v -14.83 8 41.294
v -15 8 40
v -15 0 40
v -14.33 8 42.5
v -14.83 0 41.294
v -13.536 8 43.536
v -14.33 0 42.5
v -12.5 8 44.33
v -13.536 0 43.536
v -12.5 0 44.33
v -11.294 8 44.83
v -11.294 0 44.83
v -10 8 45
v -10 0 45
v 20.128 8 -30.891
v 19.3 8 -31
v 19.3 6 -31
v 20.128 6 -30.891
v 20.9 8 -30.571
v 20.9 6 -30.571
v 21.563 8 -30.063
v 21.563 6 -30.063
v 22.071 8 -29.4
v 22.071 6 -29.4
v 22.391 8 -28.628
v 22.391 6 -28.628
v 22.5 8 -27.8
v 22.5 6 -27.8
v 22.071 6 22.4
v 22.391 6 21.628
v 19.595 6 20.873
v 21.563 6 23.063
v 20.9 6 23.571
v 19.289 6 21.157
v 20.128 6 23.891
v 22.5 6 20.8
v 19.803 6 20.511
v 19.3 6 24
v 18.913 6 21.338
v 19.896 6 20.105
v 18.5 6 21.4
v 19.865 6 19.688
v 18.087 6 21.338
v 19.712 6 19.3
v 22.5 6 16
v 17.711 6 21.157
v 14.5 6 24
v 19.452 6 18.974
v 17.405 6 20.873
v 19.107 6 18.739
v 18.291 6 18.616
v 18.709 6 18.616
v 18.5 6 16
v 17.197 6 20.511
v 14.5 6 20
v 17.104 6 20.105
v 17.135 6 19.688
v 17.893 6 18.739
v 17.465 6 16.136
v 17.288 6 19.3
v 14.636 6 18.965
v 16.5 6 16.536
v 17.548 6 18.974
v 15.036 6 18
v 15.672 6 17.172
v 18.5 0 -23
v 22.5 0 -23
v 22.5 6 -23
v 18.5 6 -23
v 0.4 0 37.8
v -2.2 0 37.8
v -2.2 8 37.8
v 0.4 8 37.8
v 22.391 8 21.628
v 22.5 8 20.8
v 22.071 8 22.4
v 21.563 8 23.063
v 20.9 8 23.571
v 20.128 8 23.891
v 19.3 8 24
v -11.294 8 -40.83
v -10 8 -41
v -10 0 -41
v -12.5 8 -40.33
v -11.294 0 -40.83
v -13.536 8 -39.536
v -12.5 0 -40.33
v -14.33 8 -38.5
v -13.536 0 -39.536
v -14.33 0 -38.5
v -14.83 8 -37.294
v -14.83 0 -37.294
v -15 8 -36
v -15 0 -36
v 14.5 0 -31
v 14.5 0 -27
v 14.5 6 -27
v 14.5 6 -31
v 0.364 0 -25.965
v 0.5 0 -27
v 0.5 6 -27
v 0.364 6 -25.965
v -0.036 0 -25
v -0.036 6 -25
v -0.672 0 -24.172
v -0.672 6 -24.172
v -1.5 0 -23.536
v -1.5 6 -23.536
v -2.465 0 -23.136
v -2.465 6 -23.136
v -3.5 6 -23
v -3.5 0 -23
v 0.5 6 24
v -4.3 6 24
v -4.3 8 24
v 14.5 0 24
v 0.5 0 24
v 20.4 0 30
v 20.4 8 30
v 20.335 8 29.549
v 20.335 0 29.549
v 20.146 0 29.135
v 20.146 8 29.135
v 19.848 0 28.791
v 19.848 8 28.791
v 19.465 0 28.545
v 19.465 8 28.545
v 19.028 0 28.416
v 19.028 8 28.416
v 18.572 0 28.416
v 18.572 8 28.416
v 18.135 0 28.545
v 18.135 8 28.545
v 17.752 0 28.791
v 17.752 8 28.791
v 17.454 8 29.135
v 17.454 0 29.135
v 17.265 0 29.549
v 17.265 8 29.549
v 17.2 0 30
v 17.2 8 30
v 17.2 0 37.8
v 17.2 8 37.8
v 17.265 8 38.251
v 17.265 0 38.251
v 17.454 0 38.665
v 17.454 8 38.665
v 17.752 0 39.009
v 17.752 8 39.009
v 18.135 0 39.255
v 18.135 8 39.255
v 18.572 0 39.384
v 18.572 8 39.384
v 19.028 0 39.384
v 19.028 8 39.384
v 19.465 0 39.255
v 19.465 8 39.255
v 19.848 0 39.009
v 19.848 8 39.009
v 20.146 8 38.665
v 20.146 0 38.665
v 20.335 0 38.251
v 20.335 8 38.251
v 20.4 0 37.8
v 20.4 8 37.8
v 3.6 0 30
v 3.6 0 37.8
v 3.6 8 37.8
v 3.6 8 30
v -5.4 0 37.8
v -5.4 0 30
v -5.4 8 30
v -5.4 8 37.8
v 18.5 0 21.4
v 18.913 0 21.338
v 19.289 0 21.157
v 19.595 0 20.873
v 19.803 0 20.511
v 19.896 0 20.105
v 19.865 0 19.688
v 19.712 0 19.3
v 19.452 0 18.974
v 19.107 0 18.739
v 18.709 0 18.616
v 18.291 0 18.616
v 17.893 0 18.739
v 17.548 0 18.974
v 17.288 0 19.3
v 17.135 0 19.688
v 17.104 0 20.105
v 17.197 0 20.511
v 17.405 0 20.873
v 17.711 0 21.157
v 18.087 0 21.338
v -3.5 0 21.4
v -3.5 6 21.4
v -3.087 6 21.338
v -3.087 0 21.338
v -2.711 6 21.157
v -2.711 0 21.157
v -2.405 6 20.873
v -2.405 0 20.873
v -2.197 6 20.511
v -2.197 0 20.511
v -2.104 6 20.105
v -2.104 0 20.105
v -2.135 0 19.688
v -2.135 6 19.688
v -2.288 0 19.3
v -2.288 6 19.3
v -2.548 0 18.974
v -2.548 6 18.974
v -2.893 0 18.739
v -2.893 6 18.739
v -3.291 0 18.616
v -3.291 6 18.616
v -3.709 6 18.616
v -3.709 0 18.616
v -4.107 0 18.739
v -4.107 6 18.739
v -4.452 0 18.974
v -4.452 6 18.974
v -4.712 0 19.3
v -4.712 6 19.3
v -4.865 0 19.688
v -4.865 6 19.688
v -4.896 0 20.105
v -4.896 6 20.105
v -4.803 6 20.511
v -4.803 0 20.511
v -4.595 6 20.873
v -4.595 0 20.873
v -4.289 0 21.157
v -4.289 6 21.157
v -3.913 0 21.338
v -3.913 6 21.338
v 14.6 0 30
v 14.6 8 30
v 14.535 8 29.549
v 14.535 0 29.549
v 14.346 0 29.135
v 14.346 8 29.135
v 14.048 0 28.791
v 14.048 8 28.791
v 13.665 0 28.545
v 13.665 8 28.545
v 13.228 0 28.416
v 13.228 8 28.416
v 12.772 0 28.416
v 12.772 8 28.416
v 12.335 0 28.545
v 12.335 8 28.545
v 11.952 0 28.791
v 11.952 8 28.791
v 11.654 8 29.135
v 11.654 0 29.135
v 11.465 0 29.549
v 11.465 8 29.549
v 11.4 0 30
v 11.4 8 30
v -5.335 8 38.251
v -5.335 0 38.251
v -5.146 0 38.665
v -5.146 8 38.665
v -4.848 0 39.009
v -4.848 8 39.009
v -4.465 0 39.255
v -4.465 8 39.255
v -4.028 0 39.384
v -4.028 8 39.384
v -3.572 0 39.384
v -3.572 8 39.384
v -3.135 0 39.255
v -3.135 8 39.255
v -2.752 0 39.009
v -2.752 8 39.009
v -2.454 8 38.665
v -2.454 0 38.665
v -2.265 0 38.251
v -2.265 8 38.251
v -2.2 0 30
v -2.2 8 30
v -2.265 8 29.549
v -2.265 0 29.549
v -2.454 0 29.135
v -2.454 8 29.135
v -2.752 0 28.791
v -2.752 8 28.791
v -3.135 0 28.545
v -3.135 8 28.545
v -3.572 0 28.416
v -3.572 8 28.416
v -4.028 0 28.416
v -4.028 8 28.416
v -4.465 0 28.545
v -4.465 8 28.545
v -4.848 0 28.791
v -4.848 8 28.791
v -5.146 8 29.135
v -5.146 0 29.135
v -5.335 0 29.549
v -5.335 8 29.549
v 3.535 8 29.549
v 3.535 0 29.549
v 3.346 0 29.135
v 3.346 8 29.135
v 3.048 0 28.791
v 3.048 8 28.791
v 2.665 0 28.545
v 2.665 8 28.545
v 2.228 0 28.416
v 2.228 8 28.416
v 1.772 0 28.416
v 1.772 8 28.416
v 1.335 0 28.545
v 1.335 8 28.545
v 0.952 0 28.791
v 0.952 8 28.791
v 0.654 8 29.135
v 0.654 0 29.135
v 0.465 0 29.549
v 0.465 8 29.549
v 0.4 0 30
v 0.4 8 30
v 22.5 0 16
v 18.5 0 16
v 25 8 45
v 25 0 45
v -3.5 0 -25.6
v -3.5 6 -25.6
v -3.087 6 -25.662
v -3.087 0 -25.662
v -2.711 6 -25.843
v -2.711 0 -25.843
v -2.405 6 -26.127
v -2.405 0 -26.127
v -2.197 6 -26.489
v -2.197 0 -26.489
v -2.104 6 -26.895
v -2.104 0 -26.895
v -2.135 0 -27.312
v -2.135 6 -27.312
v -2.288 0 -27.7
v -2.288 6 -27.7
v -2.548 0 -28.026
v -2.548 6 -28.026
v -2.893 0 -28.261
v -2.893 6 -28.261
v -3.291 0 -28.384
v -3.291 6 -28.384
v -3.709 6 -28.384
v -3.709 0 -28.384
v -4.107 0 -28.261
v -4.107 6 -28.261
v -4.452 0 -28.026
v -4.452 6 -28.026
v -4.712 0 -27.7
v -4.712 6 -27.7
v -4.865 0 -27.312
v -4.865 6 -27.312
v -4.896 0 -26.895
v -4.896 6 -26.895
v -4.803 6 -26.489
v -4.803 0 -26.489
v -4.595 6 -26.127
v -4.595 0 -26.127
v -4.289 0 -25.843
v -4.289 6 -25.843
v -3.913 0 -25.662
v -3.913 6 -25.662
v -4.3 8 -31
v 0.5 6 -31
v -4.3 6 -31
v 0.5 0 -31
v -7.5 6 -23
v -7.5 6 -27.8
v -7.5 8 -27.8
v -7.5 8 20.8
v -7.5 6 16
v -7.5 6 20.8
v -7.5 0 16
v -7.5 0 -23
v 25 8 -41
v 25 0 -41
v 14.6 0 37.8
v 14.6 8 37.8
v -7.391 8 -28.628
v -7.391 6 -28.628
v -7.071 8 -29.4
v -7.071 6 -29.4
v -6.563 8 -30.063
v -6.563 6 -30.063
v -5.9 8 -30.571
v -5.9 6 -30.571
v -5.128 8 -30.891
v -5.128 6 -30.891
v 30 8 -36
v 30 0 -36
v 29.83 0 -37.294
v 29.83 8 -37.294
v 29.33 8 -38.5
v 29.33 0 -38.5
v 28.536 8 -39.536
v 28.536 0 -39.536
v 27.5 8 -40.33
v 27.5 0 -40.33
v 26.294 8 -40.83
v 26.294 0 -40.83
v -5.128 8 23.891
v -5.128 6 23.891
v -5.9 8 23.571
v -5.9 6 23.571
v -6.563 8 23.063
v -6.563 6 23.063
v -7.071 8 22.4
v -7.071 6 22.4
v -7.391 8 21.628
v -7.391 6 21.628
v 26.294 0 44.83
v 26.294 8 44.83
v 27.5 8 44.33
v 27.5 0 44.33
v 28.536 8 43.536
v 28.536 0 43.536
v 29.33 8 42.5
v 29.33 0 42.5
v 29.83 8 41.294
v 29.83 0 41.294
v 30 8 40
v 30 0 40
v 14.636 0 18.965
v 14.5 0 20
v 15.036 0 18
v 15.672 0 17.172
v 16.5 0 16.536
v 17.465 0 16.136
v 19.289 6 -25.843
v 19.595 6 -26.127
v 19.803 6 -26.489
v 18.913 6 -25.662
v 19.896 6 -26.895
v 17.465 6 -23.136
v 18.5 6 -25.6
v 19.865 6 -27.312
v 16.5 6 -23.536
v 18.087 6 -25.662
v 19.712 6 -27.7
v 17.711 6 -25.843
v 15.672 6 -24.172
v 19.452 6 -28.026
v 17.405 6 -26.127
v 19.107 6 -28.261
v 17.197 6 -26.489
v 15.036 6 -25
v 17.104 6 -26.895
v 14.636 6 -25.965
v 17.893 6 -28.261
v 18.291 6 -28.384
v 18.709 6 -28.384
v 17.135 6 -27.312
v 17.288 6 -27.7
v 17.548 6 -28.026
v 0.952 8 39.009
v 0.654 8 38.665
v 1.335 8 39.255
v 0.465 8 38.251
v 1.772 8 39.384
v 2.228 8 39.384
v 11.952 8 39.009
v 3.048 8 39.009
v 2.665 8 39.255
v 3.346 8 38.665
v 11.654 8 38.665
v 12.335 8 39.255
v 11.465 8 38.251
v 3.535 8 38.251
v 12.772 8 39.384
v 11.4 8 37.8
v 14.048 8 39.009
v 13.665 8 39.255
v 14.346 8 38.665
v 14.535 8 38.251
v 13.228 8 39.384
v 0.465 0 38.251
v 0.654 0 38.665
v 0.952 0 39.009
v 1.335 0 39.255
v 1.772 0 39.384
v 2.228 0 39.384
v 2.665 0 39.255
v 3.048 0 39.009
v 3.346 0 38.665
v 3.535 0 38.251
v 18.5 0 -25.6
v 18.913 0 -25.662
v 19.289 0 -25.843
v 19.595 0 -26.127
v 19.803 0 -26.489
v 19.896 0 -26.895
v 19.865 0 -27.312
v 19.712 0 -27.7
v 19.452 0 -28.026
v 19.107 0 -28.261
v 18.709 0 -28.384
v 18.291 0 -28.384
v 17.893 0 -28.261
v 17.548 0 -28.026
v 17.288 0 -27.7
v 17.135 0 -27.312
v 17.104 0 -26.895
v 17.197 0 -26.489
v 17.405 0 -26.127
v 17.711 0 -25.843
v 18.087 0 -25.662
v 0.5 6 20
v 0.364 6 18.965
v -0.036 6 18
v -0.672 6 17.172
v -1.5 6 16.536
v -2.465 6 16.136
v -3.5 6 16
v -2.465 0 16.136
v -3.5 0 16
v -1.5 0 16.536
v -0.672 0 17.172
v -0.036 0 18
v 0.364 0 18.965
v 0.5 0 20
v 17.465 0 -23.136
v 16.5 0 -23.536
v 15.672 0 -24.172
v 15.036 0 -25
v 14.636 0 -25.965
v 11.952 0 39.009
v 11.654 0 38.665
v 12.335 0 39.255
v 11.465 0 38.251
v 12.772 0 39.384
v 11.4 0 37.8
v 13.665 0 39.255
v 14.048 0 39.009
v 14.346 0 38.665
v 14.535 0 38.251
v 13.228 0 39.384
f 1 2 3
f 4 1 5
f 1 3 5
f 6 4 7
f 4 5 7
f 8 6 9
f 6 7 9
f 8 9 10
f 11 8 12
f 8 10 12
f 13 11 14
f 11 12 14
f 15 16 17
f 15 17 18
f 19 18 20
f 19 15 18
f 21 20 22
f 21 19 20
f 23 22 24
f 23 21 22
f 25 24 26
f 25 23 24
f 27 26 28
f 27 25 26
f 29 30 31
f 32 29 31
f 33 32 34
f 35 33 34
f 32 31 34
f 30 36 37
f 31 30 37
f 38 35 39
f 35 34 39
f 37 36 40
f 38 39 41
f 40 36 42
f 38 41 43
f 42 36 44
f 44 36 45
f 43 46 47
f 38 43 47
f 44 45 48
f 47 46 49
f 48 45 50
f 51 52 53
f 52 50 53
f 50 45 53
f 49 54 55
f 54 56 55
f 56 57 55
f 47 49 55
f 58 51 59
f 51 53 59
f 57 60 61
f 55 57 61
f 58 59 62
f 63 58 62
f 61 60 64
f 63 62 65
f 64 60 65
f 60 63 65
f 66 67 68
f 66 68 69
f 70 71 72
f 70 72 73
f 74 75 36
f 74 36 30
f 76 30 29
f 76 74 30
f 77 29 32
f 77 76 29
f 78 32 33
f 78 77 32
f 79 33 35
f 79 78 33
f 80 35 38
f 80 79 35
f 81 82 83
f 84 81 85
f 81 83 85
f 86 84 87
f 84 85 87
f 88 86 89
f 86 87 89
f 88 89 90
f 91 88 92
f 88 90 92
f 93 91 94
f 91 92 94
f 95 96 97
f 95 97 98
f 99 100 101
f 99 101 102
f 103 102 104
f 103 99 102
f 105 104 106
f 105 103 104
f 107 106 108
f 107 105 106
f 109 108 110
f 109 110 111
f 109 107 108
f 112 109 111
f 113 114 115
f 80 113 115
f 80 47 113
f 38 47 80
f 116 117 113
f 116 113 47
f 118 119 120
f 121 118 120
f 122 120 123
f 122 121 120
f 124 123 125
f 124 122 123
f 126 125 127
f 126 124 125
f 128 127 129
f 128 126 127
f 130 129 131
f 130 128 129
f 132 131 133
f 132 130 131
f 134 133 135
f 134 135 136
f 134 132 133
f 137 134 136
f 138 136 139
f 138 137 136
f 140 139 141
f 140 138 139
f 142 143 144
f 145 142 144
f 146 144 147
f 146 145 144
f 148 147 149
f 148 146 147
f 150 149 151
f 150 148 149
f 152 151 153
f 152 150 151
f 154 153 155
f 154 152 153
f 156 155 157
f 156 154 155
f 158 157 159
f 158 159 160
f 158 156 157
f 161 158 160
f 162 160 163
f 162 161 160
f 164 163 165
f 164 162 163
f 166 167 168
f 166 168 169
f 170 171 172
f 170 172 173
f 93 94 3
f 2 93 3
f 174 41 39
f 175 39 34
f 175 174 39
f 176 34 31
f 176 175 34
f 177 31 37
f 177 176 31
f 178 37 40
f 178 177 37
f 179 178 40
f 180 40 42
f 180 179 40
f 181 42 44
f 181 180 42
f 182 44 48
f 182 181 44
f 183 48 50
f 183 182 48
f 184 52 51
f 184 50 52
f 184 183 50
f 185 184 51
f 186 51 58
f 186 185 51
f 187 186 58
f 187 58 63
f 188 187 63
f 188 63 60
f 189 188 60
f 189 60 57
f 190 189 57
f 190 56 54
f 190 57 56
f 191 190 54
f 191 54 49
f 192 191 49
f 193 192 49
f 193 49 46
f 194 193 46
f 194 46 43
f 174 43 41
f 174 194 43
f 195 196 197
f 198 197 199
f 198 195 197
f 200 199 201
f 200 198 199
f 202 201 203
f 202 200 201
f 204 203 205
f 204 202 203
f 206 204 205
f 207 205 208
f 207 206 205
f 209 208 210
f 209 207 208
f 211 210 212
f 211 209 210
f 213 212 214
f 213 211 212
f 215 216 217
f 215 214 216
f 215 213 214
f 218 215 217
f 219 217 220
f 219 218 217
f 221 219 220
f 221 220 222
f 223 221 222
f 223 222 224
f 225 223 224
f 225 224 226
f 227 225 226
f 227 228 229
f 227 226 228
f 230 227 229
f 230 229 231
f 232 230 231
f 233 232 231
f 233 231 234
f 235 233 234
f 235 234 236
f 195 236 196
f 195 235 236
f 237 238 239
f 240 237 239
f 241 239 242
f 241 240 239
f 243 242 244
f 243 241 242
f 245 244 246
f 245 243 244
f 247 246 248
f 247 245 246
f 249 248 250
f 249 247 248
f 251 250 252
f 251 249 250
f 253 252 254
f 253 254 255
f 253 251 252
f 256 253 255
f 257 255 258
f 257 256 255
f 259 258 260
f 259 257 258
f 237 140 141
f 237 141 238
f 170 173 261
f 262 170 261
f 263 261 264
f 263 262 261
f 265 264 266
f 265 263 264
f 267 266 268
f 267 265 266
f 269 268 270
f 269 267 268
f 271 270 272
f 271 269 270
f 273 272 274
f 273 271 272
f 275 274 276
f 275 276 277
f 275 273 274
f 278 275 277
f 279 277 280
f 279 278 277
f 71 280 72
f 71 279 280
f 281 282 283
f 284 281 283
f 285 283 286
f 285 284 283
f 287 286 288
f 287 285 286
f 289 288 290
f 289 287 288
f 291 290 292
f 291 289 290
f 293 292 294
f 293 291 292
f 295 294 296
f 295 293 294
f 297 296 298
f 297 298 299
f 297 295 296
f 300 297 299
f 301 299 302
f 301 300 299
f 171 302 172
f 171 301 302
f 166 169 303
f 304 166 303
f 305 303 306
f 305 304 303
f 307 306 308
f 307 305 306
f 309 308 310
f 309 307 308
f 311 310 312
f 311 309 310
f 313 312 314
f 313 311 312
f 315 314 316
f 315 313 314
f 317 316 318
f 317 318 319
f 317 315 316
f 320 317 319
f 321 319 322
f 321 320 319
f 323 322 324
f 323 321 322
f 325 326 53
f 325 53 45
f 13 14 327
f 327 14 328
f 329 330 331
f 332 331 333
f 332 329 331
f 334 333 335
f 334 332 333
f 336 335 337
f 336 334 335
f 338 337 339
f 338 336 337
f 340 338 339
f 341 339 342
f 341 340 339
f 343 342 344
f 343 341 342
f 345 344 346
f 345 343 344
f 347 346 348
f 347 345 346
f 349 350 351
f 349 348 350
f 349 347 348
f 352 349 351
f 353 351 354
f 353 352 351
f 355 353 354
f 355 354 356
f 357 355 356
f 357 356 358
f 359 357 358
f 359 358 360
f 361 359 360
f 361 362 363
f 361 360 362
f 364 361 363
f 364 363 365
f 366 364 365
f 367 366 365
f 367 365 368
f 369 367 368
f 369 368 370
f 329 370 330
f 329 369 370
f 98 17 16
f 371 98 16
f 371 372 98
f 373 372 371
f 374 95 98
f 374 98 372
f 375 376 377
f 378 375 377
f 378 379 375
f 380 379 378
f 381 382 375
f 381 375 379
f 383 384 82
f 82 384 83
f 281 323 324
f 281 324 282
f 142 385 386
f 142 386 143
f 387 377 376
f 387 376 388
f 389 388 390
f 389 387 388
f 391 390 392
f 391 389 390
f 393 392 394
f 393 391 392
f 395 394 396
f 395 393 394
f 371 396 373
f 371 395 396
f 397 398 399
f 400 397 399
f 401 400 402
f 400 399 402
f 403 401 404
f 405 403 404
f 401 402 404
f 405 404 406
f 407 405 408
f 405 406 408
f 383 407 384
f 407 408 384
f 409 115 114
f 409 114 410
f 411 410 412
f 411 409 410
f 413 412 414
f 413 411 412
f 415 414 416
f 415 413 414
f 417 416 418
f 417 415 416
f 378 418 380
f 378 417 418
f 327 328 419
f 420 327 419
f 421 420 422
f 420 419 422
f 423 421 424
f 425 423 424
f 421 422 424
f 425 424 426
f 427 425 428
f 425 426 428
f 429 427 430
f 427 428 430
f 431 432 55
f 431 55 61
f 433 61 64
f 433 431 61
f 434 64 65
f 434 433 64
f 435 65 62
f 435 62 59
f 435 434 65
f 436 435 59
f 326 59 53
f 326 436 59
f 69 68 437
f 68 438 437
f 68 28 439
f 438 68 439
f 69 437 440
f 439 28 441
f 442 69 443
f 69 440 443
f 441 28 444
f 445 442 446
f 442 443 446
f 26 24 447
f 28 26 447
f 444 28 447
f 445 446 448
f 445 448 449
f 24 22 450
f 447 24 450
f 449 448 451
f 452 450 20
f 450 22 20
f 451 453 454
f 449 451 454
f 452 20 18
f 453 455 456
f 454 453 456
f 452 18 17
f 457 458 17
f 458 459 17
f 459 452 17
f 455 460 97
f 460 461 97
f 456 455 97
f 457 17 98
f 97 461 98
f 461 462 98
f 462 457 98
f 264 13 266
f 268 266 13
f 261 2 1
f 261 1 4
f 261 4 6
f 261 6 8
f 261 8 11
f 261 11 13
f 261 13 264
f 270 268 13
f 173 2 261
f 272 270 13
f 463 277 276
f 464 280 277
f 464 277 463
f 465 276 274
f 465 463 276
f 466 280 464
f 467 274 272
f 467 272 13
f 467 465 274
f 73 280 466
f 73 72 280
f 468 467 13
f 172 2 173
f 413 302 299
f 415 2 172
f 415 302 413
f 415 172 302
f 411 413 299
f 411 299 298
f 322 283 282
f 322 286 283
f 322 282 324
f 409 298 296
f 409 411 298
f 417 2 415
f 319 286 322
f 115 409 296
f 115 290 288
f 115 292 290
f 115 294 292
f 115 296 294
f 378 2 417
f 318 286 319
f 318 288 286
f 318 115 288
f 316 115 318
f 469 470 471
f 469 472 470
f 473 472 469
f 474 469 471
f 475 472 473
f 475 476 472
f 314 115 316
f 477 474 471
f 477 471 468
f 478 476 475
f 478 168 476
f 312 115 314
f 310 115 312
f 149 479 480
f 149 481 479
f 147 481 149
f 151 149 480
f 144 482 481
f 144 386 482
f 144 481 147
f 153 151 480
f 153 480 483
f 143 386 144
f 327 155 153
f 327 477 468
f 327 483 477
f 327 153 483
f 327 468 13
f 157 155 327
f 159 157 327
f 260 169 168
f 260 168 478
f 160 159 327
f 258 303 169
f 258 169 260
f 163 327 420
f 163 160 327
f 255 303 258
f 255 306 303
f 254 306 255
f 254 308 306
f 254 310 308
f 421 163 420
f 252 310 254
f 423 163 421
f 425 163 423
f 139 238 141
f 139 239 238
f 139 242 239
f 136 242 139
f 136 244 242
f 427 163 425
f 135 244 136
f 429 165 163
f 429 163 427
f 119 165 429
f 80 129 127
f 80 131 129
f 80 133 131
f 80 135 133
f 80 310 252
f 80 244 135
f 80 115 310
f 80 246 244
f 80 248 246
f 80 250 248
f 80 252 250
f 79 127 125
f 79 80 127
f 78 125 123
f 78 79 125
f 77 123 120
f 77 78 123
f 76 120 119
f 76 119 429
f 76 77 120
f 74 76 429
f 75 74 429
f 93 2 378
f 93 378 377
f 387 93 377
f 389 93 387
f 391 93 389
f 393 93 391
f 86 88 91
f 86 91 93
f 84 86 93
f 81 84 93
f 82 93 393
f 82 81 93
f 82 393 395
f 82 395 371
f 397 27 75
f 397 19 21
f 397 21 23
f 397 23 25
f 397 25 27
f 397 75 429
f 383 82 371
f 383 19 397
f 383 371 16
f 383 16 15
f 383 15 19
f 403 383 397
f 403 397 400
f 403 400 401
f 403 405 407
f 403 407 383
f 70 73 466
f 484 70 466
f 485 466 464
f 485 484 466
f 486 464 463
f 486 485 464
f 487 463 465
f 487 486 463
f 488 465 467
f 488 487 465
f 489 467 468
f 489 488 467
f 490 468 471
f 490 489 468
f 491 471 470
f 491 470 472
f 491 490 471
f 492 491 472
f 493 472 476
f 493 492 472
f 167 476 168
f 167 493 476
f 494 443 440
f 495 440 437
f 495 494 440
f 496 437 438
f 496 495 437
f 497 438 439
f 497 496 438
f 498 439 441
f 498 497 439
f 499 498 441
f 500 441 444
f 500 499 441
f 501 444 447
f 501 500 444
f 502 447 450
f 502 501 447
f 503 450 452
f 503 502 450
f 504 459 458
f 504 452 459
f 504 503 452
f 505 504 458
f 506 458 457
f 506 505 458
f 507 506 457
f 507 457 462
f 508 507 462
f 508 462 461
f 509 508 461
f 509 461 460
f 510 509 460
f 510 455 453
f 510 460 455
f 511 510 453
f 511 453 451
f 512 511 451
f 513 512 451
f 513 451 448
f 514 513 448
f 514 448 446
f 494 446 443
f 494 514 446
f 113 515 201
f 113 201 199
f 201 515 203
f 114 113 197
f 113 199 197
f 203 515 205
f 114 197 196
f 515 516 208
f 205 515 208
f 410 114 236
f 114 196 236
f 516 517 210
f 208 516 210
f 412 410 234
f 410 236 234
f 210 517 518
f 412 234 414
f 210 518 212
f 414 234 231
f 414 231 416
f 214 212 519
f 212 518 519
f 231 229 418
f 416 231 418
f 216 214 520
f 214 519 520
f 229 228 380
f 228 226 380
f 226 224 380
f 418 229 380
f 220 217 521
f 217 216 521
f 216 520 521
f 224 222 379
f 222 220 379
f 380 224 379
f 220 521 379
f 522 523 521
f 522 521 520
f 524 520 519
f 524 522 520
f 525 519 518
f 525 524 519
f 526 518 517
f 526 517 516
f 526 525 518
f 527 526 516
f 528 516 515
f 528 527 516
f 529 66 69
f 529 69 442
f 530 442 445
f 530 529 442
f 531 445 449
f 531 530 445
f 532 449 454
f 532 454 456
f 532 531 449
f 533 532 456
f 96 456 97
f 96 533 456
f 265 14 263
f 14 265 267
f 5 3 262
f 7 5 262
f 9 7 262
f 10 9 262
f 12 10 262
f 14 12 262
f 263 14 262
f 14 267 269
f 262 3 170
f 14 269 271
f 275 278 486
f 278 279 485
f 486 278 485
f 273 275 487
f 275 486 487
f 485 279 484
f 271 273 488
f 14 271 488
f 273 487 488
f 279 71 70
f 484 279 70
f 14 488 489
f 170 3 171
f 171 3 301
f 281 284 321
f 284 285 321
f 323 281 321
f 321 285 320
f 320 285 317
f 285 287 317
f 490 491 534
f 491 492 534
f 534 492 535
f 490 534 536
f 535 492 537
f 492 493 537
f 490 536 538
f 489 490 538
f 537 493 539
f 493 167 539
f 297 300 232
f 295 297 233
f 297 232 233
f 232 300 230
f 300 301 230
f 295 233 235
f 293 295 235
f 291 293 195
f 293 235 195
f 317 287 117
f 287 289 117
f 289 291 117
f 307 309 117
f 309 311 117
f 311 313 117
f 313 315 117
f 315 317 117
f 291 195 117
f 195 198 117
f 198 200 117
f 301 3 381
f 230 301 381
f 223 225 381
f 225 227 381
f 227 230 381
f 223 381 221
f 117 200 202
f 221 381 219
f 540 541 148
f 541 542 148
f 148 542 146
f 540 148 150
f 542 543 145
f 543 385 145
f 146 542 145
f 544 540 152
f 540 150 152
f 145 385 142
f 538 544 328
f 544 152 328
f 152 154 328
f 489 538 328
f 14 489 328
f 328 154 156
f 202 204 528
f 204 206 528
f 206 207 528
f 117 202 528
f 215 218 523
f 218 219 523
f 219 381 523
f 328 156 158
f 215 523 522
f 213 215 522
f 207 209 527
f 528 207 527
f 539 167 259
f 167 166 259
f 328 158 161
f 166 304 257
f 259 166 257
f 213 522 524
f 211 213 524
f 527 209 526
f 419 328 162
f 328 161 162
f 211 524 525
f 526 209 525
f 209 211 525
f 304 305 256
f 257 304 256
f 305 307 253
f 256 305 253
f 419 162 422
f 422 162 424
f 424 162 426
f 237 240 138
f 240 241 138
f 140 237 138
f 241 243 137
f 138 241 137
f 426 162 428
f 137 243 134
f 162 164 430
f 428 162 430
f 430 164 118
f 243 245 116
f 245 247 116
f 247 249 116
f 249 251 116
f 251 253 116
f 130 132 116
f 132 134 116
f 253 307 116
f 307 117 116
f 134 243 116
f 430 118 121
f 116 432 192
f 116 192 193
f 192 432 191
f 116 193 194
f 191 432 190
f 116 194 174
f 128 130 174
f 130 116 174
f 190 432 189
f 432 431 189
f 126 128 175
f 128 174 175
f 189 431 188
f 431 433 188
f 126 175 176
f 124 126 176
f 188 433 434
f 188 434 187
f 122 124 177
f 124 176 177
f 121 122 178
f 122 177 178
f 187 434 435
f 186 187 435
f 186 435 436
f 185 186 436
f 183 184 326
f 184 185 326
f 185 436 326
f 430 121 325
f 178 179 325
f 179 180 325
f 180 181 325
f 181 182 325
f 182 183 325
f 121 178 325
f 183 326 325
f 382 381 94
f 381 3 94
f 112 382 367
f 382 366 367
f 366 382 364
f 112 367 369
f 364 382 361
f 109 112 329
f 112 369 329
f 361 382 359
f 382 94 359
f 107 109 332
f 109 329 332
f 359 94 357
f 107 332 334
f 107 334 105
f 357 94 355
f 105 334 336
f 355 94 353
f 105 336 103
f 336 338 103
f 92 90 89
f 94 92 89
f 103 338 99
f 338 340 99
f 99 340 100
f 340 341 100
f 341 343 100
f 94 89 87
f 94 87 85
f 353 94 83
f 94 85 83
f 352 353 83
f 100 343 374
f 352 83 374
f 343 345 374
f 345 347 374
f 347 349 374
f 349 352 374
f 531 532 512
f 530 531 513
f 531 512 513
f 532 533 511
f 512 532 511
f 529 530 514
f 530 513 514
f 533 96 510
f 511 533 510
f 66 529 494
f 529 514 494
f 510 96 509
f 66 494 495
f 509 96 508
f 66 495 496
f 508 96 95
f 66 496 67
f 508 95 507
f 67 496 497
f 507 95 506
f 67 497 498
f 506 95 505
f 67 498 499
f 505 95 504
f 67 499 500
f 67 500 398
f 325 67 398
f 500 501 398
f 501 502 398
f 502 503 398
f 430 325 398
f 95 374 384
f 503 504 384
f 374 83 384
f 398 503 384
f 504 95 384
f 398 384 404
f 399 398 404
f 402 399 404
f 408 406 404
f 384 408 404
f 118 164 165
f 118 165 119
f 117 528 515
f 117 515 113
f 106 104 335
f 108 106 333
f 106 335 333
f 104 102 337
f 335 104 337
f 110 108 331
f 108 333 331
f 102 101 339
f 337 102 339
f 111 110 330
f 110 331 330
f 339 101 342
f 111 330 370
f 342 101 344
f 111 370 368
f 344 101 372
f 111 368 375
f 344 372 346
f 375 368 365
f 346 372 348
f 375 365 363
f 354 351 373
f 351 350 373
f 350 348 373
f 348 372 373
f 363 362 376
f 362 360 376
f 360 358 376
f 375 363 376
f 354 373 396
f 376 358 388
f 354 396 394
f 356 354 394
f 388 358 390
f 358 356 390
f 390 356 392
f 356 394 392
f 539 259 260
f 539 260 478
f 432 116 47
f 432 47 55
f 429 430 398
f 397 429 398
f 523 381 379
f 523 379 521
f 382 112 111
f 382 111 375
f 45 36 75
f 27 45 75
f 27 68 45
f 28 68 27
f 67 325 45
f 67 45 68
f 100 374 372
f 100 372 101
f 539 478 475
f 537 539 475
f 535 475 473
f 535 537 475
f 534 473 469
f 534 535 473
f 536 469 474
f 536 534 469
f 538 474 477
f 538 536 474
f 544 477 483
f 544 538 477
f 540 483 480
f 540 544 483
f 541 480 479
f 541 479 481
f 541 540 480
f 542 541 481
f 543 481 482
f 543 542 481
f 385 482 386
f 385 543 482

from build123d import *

# Parameters (mm, degrees)
SKETCH1_R           = 1.4
BOSS_EXTRUDE1_DEPTH = 8
CUT_EXTRUDE1_DEPTH  = 2


with BuildPart() as part:
    # Sketch1 → Boss-Extrude1 (new body)
    with BuildSketch(Plane(origin=(0, 0, 0), x_dir=(1, 0, 0), z_dir=(0, 1, 0))):
        with BuildLine():
            Line((-15, 36), (-15, -40))
            ThreePointArc((-15, -40), (-13.535533906, -43.535533906), (-10, -45))
            Line((-10, -45), (25, -45))
            ThreePointArc((25, -45), (28.535533906, -43.535533906), (30, -40))
            Line((30, -40), (30, 36))
            ThreePointArc((30, 36), (28.535533906, 39.535533906), (25, 41))
            Line((25, 41), (-10, 41))
            ThreePointArc((-10, 41), (-13.535533906, 39.535533906), (-15, 36))
        make_face()
        with Locations(Location((18.5, -20, 0), (0, 0, 270))):
            Circle(SKETCH1_R, mode=Mode.SUBTRACT)
        with Locations(Location((-3.5, -20, 0), (0, 0, 270))):
            Circle(SKETCH1_R, mode=Mode.SUBTRACT)
        with Locations(Location((18.5, 27, 0), (0, 0, 270))):
            Circle(SKETCH1_R, mode=Mode.SUBTRACT)
        with Locations(Location((-3.5, 27, 0), (0, 0, 270))):
            Circle(SKETCH1_R, mode=Mode.SUBTRACT)
        with BuildLine():
            Line((-2.2, -37.8), (0.4, -37.8))
            ThreePointArc((0.4, -37.8), (2, -39.4), (3.6, -37.8))
            Line((3.6, -37.8), (3.6, -30))
            ThreePointArc((3.6, -30), (2, -28.4), (0.4, -30))
            Line((0.4, -30), (-2.2, -30))
            ThreePointArc((-2.2, -30), (-3.8, -28.4), (-5.4, -30))
            Line((-5.4, -30), (-5.4, -37.8))
            ThreePointArc((-5.4, -37.8), (-3.8, -39.4), (-2.2, -37.8))
        make_face(mode=Mode.SUBTRACT)
        with BuildLine():
            Line((14.6, -37.8), (17.2, -37.8))
            ThreePointArc((17.2, -37.8), (18.8, -39.4), (20.4, -37.8))
            Line((20.4, -37.8), (20.4, -30))
            ThreePointArc((20.4, -30), (18.8, -28.4), (17.2, -30))
            Line((17.2, -30), (14.6, -30))
            ThreePointArc((14.6, -30), (13, -28.4), (11.4, -30))
            Line((11.4, -30), (11.4, -37.8))
            ThreePointArc((11.4, -37.8), (13, -39.4), (14.6, -37.8))
        make_face(mode=Mode.SUBTRACT)
        with BuildLine():
            Line((18.5, -16), (22.5, -16))
            Line((22.5, -16), (22.5, 23))
            Line((22.5, 23), (18.5, 23))
            ThreePointArc((18.5, 23), (15.671572875, 24.171572875), (14.5, 27))
            Line((14.5, 27), (14.5, 31))
            Line((14.5, 31), (0.5, 31))
            Line((0.5, 31), (0.5, 27))
            ThreePointArc((0.5, 27), (-0.671572875, 24.171572875), (-3.5, 23))
            Line((-3.5, 23), (-7.5, 23))
            Line((-7.5, 23), (-7.5, -16))
            Line((-7.5, -16), (-3.5, -16))
            ThreePointArc((-3.5, -16), (-0.671572875, -17.171572875), (0.5, -20))
            Line((0.5, -20), (0.5, -24))
            Line((0.5, -24), (14.5, -24))
            Line((14.5, -24), (14.5, -20))
            ThreePointArc((14.5, -20), (15.671572875, -17.171572875), (18.5, -16))
        make_face(mode=Mode.SUBTRACT)
    extrude(amount=BOSS_EXTRUDE1_DEPTH)

    # Sketch2 → Cut-Extrude1 (cut)
    with BuildSketch(Plane(origin=(0, 8, 0), x_dir=(1, 0, 0), z_dir=(0, 1, 0))):
        with BuildLine():
            Line((-4.3, 31), (19.3, 31))
            ThreePointArc((19.3, 31), (21.5627417, 30.0627417), (22.5, 27.8))
            Line((22.5, 27.8), (22.5, -20.8))
            ThreePointArc((22.5, -20.8), (21.5627417, -23.0627417), (19.3, -24))
            Line((19.3, -24), (-4.3, -24))
            ThreePointArc((-4.3, -24), (-6.5627417, -23.0627417), (-7.5, -20.8))
            Line((-7.5, -20.8), (-7.5, 27.8))
            ThreePointArc((-7.5, 27.8), (-6.5627417, 30.0627417), (-4.3, 31))
        make_face()
    extrude(amount=-CUT_EXTRUDE1_DEPTH, mode=Mode.SUBTRACT)


solid = part.part
